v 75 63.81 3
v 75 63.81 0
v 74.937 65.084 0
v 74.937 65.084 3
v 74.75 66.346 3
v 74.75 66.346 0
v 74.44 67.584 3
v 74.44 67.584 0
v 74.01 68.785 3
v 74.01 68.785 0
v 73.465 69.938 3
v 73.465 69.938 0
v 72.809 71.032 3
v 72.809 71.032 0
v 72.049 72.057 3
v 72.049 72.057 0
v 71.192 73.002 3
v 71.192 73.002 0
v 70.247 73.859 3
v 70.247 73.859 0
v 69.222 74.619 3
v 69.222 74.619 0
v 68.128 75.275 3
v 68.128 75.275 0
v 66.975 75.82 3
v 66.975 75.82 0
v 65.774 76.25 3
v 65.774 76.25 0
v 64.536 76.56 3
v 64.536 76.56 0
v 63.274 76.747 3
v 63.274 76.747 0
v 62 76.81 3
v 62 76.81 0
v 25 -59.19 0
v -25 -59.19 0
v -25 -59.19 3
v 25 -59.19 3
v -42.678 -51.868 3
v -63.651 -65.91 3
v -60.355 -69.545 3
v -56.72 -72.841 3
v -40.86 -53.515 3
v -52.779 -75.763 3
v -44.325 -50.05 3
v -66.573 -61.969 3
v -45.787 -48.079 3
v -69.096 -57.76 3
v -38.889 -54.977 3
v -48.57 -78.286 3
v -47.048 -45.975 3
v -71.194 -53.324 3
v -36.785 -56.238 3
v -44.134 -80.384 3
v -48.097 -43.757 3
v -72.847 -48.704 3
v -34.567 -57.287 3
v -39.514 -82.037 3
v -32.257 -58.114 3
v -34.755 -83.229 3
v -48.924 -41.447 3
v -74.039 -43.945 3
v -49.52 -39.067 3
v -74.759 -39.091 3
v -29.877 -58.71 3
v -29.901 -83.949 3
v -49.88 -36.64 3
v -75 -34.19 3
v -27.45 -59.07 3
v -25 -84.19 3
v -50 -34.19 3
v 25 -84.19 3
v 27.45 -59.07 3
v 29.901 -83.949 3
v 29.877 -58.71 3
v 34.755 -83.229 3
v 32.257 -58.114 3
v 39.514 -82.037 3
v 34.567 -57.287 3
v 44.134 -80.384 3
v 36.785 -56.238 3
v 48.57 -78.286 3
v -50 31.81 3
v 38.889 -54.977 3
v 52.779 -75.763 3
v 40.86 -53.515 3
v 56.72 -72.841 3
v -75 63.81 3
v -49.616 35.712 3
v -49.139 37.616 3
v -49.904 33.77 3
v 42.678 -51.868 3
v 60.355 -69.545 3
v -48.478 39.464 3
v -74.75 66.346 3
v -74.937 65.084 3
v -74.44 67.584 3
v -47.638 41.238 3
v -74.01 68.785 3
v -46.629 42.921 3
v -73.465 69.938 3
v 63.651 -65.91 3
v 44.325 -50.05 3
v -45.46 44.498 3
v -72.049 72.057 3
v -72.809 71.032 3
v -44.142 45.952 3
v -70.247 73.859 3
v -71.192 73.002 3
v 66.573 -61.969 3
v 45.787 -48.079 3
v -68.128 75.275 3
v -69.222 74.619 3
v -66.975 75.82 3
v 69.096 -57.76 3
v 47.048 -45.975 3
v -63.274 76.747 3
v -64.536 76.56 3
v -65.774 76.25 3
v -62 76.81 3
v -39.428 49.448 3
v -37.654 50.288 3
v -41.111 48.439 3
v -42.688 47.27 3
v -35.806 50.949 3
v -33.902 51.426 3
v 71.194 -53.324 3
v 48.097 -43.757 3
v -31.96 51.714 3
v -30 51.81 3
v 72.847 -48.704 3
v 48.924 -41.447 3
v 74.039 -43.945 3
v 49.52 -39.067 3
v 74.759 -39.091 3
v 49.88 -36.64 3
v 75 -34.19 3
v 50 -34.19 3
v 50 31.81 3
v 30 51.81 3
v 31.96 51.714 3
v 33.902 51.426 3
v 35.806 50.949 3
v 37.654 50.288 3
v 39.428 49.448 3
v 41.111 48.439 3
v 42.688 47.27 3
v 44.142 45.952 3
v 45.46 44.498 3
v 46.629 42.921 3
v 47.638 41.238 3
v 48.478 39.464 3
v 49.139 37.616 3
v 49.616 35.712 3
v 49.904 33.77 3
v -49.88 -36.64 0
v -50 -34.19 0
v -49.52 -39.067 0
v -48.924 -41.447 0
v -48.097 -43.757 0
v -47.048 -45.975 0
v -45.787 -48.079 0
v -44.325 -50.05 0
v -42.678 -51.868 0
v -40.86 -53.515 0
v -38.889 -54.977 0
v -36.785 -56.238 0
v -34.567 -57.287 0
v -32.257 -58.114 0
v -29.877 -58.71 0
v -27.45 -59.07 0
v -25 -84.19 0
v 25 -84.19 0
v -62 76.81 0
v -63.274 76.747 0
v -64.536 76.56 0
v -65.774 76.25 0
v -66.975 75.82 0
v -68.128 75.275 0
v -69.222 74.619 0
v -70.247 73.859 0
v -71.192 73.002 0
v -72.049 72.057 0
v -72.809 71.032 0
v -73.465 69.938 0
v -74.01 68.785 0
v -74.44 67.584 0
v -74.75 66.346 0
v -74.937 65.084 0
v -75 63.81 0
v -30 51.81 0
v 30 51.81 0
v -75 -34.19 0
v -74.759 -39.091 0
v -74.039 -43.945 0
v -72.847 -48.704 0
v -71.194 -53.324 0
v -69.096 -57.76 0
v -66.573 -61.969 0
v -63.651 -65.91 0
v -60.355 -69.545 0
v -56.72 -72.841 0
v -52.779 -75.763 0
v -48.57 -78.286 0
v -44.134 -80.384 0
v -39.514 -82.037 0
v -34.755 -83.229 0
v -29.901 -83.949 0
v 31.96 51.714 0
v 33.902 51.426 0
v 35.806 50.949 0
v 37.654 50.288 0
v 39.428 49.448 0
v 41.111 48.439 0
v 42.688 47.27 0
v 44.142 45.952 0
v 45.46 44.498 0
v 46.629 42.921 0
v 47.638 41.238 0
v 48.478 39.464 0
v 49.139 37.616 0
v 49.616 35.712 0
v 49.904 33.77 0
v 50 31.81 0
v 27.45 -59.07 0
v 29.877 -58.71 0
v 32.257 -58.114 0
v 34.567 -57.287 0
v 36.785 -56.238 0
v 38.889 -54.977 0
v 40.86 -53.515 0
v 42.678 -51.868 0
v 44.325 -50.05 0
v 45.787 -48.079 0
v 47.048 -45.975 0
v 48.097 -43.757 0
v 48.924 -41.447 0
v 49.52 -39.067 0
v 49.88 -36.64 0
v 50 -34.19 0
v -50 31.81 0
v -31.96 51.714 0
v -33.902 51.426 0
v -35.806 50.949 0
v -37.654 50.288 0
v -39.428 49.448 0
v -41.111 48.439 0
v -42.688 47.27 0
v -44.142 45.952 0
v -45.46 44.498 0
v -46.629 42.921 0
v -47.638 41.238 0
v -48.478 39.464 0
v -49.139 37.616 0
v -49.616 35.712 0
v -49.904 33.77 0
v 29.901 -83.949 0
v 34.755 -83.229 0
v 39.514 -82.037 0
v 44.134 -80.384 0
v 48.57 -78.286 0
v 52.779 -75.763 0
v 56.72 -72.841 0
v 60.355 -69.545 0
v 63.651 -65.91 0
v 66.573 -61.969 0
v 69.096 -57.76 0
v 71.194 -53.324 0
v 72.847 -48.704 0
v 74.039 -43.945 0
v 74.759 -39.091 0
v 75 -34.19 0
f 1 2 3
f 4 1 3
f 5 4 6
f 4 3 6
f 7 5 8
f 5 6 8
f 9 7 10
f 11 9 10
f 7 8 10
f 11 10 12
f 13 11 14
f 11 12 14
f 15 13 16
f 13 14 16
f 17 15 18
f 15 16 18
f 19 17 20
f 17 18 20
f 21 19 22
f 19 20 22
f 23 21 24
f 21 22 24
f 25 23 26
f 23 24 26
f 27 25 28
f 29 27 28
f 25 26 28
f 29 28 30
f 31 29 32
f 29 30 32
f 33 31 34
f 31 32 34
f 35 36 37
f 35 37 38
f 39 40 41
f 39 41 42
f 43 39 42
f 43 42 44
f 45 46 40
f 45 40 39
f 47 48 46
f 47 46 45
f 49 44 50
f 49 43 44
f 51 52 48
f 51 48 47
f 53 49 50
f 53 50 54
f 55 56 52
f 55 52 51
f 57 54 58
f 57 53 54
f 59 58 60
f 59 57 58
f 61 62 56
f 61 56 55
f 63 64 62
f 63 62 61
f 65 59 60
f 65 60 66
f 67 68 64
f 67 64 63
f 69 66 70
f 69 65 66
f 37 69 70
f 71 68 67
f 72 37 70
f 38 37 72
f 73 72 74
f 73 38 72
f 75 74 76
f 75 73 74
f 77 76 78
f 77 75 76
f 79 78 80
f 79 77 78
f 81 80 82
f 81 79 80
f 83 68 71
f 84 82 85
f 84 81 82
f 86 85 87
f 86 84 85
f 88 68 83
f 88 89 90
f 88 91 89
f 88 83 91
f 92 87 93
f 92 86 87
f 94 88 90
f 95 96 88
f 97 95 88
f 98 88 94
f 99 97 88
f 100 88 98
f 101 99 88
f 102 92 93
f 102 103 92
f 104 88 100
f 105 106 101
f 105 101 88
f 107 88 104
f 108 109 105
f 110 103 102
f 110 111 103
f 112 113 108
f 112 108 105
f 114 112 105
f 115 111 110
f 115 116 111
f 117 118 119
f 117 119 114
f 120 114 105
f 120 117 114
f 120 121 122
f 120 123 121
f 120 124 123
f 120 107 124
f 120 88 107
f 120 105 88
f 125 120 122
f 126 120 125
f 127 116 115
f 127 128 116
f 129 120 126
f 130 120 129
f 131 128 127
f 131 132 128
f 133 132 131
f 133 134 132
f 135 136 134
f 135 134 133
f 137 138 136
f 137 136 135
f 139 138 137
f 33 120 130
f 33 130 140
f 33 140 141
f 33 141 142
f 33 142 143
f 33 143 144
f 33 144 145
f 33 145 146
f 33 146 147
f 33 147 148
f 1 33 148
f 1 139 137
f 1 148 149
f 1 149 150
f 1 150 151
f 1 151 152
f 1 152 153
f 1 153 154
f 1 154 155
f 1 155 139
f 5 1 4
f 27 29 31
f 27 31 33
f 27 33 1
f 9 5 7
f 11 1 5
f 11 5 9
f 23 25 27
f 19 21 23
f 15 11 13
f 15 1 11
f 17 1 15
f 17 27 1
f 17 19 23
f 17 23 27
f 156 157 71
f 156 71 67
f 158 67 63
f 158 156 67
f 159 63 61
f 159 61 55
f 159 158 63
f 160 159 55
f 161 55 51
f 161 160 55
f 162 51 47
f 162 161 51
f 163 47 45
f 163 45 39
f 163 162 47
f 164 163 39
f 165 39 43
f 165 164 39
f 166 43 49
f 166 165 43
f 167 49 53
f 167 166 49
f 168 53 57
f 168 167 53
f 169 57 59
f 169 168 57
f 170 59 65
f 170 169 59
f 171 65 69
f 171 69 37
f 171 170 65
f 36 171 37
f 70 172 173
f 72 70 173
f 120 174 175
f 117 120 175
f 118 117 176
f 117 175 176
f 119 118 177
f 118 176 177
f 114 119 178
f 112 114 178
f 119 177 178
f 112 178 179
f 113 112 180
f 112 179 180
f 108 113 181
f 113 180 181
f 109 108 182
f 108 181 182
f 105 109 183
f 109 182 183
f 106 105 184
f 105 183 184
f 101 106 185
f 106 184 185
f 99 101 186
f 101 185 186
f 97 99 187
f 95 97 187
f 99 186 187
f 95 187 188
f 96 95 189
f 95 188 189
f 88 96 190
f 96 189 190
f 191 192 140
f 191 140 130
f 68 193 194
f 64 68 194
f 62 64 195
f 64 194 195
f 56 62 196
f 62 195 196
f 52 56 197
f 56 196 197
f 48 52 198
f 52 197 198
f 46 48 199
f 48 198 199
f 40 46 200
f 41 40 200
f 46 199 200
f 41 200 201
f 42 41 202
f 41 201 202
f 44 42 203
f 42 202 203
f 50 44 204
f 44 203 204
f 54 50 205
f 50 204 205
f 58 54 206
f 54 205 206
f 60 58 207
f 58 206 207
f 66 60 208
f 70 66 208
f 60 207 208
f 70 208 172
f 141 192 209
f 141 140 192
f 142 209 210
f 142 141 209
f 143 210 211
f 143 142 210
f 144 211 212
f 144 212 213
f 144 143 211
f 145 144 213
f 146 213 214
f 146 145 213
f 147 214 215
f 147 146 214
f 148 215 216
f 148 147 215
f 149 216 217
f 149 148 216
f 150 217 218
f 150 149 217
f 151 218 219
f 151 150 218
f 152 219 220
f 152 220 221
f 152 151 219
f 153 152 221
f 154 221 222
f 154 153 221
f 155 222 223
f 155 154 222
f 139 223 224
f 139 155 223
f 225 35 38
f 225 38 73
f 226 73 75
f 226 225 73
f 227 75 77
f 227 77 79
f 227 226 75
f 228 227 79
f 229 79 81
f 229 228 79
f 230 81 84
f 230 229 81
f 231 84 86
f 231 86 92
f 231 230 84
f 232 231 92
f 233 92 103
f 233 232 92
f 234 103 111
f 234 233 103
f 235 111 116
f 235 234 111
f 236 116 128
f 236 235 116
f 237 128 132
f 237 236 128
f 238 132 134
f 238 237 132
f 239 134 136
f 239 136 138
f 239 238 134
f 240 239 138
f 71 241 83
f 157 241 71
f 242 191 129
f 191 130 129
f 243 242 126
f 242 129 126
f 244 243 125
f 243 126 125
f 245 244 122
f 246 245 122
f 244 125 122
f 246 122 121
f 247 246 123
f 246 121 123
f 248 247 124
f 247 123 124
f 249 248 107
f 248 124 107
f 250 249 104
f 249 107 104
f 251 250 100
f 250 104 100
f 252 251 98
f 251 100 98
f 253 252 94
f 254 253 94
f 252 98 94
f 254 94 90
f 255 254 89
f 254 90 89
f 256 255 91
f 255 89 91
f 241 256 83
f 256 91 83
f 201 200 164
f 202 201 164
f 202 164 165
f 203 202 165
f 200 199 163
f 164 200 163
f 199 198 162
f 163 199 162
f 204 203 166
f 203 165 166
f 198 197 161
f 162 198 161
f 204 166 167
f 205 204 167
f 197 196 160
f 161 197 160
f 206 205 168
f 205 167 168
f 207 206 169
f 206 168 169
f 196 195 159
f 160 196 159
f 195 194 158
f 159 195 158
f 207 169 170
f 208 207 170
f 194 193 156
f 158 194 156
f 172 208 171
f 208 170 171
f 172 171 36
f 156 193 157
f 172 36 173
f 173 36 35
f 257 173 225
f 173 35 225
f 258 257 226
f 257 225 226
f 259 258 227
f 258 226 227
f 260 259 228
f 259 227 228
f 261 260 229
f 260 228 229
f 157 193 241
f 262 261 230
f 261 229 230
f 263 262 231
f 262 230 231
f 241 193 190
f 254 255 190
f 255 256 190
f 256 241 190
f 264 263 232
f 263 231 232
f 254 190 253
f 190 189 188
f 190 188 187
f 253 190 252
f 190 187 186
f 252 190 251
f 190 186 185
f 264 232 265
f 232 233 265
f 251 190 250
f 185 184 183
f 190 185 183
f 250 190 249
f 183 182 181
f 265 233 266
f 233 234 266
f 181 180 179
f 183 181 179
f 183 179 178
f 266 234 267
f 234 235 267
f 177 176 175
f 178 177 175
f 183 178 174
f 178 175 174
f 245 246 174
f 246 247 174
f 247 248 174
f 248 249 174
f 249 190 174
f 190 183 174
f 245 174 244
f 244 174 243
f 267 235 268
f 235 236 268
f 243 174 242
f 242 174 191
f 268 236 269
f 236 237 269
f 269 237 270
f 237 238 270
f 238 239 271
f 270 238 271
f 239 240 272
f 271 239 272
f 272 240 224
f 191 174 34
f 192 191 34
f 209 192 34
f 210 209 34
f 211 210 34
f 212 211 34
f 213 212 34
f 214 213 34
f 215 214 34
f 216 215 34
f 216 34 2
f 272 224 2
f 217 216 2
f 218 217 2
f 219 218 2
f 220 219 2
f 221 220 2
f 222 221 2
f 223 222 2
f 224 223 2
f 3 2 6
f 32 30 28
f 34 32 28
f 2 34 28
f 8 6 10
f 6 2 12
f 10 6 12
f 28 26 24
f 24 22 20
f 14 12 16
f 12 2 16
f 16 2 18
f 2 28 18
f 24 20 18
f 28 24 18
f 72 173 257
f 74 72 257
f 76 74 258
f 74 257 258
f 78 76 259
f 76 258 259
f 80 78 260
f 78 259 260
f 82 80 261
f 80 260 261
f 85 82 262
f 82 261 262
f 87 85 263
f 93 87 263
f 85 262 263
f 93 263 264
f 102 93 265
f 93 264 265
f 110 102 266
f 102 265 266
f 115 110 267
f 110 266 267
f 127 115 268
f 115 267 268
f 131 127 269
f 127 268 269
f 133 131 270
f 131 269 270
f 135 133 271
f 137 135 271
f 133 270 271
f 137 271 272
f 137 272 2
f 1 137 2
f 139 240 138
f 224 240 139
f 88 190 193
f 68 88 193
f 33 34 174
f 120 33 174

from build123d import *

# Parameters (mm, degrees)
BOSS_EXTRUDE1_DEPTH = 3
FILLET1_R           = 20


with BuildPart() as part:
    # Sketch1 → Boss-Extrude1 (new body)
    with BuildSketch(Plane.XY):
        with BuildLine():
            Line((-0.5, -84.19), (0.5, -84.19))
            Line((0.5, -84.19), (25, -84.19))
            ThreePointArc((25, -84.19), (60.355339059, -69.545339059), (75, -34.19))
            Line((75, -34.19), (75, 63.81))
            ThreePointArc((75, 63.81), (71.192388155, 73.002388155), (62, 76.81))
            Line((62, 76.81), (-62, 76.81))
            ThreePointArc((-62, 76.81), (-71.192388155, 73.002388155), (-75, 63.81))
            Line((-75, 63.81), (-75, -34.19))
            ThreePointArc((-75, -34.19), (-60.355339059, -69.545339059), (-25, -84.19))
            Line((-25, -84.19), (-0.5, -84.19))
        make_face()
        with BuildLine():
            Line((50, 51.81), (-50, 51.81))
            Line((-50, 51.81), (-50, -34.19))
            ThreePointArc((-50, -34.19), (-42.67766953, -51.86766953), (-25, -59.19))
            Line((-25, -59.19), (-0.5, -59.19))
            Line((-0.5, -59.19), (0.5, -59.19))
            Line((0.5, -59.19), (25, -59.19))
            ThreePointArc((25, -59.19), (42.67766953, -51.86766953), (50, -34.19))
            Line((50, -34.19), (50, 51.81))
        make_face(mode=Mode.SUBTRACT)
    extrude(amount=BOSS_EXTRUDE1_DEPTH)

    # Fillet1
    fillet1_edges = [part.edges().sort_by_distance(p)[0] for p in [
        (50, 51.81, 1.5),
        (-50, 51.81, 1.5),
    ]]
    fillet(fillet1_edges, radius=FILLET1_R)


solid = part.part
